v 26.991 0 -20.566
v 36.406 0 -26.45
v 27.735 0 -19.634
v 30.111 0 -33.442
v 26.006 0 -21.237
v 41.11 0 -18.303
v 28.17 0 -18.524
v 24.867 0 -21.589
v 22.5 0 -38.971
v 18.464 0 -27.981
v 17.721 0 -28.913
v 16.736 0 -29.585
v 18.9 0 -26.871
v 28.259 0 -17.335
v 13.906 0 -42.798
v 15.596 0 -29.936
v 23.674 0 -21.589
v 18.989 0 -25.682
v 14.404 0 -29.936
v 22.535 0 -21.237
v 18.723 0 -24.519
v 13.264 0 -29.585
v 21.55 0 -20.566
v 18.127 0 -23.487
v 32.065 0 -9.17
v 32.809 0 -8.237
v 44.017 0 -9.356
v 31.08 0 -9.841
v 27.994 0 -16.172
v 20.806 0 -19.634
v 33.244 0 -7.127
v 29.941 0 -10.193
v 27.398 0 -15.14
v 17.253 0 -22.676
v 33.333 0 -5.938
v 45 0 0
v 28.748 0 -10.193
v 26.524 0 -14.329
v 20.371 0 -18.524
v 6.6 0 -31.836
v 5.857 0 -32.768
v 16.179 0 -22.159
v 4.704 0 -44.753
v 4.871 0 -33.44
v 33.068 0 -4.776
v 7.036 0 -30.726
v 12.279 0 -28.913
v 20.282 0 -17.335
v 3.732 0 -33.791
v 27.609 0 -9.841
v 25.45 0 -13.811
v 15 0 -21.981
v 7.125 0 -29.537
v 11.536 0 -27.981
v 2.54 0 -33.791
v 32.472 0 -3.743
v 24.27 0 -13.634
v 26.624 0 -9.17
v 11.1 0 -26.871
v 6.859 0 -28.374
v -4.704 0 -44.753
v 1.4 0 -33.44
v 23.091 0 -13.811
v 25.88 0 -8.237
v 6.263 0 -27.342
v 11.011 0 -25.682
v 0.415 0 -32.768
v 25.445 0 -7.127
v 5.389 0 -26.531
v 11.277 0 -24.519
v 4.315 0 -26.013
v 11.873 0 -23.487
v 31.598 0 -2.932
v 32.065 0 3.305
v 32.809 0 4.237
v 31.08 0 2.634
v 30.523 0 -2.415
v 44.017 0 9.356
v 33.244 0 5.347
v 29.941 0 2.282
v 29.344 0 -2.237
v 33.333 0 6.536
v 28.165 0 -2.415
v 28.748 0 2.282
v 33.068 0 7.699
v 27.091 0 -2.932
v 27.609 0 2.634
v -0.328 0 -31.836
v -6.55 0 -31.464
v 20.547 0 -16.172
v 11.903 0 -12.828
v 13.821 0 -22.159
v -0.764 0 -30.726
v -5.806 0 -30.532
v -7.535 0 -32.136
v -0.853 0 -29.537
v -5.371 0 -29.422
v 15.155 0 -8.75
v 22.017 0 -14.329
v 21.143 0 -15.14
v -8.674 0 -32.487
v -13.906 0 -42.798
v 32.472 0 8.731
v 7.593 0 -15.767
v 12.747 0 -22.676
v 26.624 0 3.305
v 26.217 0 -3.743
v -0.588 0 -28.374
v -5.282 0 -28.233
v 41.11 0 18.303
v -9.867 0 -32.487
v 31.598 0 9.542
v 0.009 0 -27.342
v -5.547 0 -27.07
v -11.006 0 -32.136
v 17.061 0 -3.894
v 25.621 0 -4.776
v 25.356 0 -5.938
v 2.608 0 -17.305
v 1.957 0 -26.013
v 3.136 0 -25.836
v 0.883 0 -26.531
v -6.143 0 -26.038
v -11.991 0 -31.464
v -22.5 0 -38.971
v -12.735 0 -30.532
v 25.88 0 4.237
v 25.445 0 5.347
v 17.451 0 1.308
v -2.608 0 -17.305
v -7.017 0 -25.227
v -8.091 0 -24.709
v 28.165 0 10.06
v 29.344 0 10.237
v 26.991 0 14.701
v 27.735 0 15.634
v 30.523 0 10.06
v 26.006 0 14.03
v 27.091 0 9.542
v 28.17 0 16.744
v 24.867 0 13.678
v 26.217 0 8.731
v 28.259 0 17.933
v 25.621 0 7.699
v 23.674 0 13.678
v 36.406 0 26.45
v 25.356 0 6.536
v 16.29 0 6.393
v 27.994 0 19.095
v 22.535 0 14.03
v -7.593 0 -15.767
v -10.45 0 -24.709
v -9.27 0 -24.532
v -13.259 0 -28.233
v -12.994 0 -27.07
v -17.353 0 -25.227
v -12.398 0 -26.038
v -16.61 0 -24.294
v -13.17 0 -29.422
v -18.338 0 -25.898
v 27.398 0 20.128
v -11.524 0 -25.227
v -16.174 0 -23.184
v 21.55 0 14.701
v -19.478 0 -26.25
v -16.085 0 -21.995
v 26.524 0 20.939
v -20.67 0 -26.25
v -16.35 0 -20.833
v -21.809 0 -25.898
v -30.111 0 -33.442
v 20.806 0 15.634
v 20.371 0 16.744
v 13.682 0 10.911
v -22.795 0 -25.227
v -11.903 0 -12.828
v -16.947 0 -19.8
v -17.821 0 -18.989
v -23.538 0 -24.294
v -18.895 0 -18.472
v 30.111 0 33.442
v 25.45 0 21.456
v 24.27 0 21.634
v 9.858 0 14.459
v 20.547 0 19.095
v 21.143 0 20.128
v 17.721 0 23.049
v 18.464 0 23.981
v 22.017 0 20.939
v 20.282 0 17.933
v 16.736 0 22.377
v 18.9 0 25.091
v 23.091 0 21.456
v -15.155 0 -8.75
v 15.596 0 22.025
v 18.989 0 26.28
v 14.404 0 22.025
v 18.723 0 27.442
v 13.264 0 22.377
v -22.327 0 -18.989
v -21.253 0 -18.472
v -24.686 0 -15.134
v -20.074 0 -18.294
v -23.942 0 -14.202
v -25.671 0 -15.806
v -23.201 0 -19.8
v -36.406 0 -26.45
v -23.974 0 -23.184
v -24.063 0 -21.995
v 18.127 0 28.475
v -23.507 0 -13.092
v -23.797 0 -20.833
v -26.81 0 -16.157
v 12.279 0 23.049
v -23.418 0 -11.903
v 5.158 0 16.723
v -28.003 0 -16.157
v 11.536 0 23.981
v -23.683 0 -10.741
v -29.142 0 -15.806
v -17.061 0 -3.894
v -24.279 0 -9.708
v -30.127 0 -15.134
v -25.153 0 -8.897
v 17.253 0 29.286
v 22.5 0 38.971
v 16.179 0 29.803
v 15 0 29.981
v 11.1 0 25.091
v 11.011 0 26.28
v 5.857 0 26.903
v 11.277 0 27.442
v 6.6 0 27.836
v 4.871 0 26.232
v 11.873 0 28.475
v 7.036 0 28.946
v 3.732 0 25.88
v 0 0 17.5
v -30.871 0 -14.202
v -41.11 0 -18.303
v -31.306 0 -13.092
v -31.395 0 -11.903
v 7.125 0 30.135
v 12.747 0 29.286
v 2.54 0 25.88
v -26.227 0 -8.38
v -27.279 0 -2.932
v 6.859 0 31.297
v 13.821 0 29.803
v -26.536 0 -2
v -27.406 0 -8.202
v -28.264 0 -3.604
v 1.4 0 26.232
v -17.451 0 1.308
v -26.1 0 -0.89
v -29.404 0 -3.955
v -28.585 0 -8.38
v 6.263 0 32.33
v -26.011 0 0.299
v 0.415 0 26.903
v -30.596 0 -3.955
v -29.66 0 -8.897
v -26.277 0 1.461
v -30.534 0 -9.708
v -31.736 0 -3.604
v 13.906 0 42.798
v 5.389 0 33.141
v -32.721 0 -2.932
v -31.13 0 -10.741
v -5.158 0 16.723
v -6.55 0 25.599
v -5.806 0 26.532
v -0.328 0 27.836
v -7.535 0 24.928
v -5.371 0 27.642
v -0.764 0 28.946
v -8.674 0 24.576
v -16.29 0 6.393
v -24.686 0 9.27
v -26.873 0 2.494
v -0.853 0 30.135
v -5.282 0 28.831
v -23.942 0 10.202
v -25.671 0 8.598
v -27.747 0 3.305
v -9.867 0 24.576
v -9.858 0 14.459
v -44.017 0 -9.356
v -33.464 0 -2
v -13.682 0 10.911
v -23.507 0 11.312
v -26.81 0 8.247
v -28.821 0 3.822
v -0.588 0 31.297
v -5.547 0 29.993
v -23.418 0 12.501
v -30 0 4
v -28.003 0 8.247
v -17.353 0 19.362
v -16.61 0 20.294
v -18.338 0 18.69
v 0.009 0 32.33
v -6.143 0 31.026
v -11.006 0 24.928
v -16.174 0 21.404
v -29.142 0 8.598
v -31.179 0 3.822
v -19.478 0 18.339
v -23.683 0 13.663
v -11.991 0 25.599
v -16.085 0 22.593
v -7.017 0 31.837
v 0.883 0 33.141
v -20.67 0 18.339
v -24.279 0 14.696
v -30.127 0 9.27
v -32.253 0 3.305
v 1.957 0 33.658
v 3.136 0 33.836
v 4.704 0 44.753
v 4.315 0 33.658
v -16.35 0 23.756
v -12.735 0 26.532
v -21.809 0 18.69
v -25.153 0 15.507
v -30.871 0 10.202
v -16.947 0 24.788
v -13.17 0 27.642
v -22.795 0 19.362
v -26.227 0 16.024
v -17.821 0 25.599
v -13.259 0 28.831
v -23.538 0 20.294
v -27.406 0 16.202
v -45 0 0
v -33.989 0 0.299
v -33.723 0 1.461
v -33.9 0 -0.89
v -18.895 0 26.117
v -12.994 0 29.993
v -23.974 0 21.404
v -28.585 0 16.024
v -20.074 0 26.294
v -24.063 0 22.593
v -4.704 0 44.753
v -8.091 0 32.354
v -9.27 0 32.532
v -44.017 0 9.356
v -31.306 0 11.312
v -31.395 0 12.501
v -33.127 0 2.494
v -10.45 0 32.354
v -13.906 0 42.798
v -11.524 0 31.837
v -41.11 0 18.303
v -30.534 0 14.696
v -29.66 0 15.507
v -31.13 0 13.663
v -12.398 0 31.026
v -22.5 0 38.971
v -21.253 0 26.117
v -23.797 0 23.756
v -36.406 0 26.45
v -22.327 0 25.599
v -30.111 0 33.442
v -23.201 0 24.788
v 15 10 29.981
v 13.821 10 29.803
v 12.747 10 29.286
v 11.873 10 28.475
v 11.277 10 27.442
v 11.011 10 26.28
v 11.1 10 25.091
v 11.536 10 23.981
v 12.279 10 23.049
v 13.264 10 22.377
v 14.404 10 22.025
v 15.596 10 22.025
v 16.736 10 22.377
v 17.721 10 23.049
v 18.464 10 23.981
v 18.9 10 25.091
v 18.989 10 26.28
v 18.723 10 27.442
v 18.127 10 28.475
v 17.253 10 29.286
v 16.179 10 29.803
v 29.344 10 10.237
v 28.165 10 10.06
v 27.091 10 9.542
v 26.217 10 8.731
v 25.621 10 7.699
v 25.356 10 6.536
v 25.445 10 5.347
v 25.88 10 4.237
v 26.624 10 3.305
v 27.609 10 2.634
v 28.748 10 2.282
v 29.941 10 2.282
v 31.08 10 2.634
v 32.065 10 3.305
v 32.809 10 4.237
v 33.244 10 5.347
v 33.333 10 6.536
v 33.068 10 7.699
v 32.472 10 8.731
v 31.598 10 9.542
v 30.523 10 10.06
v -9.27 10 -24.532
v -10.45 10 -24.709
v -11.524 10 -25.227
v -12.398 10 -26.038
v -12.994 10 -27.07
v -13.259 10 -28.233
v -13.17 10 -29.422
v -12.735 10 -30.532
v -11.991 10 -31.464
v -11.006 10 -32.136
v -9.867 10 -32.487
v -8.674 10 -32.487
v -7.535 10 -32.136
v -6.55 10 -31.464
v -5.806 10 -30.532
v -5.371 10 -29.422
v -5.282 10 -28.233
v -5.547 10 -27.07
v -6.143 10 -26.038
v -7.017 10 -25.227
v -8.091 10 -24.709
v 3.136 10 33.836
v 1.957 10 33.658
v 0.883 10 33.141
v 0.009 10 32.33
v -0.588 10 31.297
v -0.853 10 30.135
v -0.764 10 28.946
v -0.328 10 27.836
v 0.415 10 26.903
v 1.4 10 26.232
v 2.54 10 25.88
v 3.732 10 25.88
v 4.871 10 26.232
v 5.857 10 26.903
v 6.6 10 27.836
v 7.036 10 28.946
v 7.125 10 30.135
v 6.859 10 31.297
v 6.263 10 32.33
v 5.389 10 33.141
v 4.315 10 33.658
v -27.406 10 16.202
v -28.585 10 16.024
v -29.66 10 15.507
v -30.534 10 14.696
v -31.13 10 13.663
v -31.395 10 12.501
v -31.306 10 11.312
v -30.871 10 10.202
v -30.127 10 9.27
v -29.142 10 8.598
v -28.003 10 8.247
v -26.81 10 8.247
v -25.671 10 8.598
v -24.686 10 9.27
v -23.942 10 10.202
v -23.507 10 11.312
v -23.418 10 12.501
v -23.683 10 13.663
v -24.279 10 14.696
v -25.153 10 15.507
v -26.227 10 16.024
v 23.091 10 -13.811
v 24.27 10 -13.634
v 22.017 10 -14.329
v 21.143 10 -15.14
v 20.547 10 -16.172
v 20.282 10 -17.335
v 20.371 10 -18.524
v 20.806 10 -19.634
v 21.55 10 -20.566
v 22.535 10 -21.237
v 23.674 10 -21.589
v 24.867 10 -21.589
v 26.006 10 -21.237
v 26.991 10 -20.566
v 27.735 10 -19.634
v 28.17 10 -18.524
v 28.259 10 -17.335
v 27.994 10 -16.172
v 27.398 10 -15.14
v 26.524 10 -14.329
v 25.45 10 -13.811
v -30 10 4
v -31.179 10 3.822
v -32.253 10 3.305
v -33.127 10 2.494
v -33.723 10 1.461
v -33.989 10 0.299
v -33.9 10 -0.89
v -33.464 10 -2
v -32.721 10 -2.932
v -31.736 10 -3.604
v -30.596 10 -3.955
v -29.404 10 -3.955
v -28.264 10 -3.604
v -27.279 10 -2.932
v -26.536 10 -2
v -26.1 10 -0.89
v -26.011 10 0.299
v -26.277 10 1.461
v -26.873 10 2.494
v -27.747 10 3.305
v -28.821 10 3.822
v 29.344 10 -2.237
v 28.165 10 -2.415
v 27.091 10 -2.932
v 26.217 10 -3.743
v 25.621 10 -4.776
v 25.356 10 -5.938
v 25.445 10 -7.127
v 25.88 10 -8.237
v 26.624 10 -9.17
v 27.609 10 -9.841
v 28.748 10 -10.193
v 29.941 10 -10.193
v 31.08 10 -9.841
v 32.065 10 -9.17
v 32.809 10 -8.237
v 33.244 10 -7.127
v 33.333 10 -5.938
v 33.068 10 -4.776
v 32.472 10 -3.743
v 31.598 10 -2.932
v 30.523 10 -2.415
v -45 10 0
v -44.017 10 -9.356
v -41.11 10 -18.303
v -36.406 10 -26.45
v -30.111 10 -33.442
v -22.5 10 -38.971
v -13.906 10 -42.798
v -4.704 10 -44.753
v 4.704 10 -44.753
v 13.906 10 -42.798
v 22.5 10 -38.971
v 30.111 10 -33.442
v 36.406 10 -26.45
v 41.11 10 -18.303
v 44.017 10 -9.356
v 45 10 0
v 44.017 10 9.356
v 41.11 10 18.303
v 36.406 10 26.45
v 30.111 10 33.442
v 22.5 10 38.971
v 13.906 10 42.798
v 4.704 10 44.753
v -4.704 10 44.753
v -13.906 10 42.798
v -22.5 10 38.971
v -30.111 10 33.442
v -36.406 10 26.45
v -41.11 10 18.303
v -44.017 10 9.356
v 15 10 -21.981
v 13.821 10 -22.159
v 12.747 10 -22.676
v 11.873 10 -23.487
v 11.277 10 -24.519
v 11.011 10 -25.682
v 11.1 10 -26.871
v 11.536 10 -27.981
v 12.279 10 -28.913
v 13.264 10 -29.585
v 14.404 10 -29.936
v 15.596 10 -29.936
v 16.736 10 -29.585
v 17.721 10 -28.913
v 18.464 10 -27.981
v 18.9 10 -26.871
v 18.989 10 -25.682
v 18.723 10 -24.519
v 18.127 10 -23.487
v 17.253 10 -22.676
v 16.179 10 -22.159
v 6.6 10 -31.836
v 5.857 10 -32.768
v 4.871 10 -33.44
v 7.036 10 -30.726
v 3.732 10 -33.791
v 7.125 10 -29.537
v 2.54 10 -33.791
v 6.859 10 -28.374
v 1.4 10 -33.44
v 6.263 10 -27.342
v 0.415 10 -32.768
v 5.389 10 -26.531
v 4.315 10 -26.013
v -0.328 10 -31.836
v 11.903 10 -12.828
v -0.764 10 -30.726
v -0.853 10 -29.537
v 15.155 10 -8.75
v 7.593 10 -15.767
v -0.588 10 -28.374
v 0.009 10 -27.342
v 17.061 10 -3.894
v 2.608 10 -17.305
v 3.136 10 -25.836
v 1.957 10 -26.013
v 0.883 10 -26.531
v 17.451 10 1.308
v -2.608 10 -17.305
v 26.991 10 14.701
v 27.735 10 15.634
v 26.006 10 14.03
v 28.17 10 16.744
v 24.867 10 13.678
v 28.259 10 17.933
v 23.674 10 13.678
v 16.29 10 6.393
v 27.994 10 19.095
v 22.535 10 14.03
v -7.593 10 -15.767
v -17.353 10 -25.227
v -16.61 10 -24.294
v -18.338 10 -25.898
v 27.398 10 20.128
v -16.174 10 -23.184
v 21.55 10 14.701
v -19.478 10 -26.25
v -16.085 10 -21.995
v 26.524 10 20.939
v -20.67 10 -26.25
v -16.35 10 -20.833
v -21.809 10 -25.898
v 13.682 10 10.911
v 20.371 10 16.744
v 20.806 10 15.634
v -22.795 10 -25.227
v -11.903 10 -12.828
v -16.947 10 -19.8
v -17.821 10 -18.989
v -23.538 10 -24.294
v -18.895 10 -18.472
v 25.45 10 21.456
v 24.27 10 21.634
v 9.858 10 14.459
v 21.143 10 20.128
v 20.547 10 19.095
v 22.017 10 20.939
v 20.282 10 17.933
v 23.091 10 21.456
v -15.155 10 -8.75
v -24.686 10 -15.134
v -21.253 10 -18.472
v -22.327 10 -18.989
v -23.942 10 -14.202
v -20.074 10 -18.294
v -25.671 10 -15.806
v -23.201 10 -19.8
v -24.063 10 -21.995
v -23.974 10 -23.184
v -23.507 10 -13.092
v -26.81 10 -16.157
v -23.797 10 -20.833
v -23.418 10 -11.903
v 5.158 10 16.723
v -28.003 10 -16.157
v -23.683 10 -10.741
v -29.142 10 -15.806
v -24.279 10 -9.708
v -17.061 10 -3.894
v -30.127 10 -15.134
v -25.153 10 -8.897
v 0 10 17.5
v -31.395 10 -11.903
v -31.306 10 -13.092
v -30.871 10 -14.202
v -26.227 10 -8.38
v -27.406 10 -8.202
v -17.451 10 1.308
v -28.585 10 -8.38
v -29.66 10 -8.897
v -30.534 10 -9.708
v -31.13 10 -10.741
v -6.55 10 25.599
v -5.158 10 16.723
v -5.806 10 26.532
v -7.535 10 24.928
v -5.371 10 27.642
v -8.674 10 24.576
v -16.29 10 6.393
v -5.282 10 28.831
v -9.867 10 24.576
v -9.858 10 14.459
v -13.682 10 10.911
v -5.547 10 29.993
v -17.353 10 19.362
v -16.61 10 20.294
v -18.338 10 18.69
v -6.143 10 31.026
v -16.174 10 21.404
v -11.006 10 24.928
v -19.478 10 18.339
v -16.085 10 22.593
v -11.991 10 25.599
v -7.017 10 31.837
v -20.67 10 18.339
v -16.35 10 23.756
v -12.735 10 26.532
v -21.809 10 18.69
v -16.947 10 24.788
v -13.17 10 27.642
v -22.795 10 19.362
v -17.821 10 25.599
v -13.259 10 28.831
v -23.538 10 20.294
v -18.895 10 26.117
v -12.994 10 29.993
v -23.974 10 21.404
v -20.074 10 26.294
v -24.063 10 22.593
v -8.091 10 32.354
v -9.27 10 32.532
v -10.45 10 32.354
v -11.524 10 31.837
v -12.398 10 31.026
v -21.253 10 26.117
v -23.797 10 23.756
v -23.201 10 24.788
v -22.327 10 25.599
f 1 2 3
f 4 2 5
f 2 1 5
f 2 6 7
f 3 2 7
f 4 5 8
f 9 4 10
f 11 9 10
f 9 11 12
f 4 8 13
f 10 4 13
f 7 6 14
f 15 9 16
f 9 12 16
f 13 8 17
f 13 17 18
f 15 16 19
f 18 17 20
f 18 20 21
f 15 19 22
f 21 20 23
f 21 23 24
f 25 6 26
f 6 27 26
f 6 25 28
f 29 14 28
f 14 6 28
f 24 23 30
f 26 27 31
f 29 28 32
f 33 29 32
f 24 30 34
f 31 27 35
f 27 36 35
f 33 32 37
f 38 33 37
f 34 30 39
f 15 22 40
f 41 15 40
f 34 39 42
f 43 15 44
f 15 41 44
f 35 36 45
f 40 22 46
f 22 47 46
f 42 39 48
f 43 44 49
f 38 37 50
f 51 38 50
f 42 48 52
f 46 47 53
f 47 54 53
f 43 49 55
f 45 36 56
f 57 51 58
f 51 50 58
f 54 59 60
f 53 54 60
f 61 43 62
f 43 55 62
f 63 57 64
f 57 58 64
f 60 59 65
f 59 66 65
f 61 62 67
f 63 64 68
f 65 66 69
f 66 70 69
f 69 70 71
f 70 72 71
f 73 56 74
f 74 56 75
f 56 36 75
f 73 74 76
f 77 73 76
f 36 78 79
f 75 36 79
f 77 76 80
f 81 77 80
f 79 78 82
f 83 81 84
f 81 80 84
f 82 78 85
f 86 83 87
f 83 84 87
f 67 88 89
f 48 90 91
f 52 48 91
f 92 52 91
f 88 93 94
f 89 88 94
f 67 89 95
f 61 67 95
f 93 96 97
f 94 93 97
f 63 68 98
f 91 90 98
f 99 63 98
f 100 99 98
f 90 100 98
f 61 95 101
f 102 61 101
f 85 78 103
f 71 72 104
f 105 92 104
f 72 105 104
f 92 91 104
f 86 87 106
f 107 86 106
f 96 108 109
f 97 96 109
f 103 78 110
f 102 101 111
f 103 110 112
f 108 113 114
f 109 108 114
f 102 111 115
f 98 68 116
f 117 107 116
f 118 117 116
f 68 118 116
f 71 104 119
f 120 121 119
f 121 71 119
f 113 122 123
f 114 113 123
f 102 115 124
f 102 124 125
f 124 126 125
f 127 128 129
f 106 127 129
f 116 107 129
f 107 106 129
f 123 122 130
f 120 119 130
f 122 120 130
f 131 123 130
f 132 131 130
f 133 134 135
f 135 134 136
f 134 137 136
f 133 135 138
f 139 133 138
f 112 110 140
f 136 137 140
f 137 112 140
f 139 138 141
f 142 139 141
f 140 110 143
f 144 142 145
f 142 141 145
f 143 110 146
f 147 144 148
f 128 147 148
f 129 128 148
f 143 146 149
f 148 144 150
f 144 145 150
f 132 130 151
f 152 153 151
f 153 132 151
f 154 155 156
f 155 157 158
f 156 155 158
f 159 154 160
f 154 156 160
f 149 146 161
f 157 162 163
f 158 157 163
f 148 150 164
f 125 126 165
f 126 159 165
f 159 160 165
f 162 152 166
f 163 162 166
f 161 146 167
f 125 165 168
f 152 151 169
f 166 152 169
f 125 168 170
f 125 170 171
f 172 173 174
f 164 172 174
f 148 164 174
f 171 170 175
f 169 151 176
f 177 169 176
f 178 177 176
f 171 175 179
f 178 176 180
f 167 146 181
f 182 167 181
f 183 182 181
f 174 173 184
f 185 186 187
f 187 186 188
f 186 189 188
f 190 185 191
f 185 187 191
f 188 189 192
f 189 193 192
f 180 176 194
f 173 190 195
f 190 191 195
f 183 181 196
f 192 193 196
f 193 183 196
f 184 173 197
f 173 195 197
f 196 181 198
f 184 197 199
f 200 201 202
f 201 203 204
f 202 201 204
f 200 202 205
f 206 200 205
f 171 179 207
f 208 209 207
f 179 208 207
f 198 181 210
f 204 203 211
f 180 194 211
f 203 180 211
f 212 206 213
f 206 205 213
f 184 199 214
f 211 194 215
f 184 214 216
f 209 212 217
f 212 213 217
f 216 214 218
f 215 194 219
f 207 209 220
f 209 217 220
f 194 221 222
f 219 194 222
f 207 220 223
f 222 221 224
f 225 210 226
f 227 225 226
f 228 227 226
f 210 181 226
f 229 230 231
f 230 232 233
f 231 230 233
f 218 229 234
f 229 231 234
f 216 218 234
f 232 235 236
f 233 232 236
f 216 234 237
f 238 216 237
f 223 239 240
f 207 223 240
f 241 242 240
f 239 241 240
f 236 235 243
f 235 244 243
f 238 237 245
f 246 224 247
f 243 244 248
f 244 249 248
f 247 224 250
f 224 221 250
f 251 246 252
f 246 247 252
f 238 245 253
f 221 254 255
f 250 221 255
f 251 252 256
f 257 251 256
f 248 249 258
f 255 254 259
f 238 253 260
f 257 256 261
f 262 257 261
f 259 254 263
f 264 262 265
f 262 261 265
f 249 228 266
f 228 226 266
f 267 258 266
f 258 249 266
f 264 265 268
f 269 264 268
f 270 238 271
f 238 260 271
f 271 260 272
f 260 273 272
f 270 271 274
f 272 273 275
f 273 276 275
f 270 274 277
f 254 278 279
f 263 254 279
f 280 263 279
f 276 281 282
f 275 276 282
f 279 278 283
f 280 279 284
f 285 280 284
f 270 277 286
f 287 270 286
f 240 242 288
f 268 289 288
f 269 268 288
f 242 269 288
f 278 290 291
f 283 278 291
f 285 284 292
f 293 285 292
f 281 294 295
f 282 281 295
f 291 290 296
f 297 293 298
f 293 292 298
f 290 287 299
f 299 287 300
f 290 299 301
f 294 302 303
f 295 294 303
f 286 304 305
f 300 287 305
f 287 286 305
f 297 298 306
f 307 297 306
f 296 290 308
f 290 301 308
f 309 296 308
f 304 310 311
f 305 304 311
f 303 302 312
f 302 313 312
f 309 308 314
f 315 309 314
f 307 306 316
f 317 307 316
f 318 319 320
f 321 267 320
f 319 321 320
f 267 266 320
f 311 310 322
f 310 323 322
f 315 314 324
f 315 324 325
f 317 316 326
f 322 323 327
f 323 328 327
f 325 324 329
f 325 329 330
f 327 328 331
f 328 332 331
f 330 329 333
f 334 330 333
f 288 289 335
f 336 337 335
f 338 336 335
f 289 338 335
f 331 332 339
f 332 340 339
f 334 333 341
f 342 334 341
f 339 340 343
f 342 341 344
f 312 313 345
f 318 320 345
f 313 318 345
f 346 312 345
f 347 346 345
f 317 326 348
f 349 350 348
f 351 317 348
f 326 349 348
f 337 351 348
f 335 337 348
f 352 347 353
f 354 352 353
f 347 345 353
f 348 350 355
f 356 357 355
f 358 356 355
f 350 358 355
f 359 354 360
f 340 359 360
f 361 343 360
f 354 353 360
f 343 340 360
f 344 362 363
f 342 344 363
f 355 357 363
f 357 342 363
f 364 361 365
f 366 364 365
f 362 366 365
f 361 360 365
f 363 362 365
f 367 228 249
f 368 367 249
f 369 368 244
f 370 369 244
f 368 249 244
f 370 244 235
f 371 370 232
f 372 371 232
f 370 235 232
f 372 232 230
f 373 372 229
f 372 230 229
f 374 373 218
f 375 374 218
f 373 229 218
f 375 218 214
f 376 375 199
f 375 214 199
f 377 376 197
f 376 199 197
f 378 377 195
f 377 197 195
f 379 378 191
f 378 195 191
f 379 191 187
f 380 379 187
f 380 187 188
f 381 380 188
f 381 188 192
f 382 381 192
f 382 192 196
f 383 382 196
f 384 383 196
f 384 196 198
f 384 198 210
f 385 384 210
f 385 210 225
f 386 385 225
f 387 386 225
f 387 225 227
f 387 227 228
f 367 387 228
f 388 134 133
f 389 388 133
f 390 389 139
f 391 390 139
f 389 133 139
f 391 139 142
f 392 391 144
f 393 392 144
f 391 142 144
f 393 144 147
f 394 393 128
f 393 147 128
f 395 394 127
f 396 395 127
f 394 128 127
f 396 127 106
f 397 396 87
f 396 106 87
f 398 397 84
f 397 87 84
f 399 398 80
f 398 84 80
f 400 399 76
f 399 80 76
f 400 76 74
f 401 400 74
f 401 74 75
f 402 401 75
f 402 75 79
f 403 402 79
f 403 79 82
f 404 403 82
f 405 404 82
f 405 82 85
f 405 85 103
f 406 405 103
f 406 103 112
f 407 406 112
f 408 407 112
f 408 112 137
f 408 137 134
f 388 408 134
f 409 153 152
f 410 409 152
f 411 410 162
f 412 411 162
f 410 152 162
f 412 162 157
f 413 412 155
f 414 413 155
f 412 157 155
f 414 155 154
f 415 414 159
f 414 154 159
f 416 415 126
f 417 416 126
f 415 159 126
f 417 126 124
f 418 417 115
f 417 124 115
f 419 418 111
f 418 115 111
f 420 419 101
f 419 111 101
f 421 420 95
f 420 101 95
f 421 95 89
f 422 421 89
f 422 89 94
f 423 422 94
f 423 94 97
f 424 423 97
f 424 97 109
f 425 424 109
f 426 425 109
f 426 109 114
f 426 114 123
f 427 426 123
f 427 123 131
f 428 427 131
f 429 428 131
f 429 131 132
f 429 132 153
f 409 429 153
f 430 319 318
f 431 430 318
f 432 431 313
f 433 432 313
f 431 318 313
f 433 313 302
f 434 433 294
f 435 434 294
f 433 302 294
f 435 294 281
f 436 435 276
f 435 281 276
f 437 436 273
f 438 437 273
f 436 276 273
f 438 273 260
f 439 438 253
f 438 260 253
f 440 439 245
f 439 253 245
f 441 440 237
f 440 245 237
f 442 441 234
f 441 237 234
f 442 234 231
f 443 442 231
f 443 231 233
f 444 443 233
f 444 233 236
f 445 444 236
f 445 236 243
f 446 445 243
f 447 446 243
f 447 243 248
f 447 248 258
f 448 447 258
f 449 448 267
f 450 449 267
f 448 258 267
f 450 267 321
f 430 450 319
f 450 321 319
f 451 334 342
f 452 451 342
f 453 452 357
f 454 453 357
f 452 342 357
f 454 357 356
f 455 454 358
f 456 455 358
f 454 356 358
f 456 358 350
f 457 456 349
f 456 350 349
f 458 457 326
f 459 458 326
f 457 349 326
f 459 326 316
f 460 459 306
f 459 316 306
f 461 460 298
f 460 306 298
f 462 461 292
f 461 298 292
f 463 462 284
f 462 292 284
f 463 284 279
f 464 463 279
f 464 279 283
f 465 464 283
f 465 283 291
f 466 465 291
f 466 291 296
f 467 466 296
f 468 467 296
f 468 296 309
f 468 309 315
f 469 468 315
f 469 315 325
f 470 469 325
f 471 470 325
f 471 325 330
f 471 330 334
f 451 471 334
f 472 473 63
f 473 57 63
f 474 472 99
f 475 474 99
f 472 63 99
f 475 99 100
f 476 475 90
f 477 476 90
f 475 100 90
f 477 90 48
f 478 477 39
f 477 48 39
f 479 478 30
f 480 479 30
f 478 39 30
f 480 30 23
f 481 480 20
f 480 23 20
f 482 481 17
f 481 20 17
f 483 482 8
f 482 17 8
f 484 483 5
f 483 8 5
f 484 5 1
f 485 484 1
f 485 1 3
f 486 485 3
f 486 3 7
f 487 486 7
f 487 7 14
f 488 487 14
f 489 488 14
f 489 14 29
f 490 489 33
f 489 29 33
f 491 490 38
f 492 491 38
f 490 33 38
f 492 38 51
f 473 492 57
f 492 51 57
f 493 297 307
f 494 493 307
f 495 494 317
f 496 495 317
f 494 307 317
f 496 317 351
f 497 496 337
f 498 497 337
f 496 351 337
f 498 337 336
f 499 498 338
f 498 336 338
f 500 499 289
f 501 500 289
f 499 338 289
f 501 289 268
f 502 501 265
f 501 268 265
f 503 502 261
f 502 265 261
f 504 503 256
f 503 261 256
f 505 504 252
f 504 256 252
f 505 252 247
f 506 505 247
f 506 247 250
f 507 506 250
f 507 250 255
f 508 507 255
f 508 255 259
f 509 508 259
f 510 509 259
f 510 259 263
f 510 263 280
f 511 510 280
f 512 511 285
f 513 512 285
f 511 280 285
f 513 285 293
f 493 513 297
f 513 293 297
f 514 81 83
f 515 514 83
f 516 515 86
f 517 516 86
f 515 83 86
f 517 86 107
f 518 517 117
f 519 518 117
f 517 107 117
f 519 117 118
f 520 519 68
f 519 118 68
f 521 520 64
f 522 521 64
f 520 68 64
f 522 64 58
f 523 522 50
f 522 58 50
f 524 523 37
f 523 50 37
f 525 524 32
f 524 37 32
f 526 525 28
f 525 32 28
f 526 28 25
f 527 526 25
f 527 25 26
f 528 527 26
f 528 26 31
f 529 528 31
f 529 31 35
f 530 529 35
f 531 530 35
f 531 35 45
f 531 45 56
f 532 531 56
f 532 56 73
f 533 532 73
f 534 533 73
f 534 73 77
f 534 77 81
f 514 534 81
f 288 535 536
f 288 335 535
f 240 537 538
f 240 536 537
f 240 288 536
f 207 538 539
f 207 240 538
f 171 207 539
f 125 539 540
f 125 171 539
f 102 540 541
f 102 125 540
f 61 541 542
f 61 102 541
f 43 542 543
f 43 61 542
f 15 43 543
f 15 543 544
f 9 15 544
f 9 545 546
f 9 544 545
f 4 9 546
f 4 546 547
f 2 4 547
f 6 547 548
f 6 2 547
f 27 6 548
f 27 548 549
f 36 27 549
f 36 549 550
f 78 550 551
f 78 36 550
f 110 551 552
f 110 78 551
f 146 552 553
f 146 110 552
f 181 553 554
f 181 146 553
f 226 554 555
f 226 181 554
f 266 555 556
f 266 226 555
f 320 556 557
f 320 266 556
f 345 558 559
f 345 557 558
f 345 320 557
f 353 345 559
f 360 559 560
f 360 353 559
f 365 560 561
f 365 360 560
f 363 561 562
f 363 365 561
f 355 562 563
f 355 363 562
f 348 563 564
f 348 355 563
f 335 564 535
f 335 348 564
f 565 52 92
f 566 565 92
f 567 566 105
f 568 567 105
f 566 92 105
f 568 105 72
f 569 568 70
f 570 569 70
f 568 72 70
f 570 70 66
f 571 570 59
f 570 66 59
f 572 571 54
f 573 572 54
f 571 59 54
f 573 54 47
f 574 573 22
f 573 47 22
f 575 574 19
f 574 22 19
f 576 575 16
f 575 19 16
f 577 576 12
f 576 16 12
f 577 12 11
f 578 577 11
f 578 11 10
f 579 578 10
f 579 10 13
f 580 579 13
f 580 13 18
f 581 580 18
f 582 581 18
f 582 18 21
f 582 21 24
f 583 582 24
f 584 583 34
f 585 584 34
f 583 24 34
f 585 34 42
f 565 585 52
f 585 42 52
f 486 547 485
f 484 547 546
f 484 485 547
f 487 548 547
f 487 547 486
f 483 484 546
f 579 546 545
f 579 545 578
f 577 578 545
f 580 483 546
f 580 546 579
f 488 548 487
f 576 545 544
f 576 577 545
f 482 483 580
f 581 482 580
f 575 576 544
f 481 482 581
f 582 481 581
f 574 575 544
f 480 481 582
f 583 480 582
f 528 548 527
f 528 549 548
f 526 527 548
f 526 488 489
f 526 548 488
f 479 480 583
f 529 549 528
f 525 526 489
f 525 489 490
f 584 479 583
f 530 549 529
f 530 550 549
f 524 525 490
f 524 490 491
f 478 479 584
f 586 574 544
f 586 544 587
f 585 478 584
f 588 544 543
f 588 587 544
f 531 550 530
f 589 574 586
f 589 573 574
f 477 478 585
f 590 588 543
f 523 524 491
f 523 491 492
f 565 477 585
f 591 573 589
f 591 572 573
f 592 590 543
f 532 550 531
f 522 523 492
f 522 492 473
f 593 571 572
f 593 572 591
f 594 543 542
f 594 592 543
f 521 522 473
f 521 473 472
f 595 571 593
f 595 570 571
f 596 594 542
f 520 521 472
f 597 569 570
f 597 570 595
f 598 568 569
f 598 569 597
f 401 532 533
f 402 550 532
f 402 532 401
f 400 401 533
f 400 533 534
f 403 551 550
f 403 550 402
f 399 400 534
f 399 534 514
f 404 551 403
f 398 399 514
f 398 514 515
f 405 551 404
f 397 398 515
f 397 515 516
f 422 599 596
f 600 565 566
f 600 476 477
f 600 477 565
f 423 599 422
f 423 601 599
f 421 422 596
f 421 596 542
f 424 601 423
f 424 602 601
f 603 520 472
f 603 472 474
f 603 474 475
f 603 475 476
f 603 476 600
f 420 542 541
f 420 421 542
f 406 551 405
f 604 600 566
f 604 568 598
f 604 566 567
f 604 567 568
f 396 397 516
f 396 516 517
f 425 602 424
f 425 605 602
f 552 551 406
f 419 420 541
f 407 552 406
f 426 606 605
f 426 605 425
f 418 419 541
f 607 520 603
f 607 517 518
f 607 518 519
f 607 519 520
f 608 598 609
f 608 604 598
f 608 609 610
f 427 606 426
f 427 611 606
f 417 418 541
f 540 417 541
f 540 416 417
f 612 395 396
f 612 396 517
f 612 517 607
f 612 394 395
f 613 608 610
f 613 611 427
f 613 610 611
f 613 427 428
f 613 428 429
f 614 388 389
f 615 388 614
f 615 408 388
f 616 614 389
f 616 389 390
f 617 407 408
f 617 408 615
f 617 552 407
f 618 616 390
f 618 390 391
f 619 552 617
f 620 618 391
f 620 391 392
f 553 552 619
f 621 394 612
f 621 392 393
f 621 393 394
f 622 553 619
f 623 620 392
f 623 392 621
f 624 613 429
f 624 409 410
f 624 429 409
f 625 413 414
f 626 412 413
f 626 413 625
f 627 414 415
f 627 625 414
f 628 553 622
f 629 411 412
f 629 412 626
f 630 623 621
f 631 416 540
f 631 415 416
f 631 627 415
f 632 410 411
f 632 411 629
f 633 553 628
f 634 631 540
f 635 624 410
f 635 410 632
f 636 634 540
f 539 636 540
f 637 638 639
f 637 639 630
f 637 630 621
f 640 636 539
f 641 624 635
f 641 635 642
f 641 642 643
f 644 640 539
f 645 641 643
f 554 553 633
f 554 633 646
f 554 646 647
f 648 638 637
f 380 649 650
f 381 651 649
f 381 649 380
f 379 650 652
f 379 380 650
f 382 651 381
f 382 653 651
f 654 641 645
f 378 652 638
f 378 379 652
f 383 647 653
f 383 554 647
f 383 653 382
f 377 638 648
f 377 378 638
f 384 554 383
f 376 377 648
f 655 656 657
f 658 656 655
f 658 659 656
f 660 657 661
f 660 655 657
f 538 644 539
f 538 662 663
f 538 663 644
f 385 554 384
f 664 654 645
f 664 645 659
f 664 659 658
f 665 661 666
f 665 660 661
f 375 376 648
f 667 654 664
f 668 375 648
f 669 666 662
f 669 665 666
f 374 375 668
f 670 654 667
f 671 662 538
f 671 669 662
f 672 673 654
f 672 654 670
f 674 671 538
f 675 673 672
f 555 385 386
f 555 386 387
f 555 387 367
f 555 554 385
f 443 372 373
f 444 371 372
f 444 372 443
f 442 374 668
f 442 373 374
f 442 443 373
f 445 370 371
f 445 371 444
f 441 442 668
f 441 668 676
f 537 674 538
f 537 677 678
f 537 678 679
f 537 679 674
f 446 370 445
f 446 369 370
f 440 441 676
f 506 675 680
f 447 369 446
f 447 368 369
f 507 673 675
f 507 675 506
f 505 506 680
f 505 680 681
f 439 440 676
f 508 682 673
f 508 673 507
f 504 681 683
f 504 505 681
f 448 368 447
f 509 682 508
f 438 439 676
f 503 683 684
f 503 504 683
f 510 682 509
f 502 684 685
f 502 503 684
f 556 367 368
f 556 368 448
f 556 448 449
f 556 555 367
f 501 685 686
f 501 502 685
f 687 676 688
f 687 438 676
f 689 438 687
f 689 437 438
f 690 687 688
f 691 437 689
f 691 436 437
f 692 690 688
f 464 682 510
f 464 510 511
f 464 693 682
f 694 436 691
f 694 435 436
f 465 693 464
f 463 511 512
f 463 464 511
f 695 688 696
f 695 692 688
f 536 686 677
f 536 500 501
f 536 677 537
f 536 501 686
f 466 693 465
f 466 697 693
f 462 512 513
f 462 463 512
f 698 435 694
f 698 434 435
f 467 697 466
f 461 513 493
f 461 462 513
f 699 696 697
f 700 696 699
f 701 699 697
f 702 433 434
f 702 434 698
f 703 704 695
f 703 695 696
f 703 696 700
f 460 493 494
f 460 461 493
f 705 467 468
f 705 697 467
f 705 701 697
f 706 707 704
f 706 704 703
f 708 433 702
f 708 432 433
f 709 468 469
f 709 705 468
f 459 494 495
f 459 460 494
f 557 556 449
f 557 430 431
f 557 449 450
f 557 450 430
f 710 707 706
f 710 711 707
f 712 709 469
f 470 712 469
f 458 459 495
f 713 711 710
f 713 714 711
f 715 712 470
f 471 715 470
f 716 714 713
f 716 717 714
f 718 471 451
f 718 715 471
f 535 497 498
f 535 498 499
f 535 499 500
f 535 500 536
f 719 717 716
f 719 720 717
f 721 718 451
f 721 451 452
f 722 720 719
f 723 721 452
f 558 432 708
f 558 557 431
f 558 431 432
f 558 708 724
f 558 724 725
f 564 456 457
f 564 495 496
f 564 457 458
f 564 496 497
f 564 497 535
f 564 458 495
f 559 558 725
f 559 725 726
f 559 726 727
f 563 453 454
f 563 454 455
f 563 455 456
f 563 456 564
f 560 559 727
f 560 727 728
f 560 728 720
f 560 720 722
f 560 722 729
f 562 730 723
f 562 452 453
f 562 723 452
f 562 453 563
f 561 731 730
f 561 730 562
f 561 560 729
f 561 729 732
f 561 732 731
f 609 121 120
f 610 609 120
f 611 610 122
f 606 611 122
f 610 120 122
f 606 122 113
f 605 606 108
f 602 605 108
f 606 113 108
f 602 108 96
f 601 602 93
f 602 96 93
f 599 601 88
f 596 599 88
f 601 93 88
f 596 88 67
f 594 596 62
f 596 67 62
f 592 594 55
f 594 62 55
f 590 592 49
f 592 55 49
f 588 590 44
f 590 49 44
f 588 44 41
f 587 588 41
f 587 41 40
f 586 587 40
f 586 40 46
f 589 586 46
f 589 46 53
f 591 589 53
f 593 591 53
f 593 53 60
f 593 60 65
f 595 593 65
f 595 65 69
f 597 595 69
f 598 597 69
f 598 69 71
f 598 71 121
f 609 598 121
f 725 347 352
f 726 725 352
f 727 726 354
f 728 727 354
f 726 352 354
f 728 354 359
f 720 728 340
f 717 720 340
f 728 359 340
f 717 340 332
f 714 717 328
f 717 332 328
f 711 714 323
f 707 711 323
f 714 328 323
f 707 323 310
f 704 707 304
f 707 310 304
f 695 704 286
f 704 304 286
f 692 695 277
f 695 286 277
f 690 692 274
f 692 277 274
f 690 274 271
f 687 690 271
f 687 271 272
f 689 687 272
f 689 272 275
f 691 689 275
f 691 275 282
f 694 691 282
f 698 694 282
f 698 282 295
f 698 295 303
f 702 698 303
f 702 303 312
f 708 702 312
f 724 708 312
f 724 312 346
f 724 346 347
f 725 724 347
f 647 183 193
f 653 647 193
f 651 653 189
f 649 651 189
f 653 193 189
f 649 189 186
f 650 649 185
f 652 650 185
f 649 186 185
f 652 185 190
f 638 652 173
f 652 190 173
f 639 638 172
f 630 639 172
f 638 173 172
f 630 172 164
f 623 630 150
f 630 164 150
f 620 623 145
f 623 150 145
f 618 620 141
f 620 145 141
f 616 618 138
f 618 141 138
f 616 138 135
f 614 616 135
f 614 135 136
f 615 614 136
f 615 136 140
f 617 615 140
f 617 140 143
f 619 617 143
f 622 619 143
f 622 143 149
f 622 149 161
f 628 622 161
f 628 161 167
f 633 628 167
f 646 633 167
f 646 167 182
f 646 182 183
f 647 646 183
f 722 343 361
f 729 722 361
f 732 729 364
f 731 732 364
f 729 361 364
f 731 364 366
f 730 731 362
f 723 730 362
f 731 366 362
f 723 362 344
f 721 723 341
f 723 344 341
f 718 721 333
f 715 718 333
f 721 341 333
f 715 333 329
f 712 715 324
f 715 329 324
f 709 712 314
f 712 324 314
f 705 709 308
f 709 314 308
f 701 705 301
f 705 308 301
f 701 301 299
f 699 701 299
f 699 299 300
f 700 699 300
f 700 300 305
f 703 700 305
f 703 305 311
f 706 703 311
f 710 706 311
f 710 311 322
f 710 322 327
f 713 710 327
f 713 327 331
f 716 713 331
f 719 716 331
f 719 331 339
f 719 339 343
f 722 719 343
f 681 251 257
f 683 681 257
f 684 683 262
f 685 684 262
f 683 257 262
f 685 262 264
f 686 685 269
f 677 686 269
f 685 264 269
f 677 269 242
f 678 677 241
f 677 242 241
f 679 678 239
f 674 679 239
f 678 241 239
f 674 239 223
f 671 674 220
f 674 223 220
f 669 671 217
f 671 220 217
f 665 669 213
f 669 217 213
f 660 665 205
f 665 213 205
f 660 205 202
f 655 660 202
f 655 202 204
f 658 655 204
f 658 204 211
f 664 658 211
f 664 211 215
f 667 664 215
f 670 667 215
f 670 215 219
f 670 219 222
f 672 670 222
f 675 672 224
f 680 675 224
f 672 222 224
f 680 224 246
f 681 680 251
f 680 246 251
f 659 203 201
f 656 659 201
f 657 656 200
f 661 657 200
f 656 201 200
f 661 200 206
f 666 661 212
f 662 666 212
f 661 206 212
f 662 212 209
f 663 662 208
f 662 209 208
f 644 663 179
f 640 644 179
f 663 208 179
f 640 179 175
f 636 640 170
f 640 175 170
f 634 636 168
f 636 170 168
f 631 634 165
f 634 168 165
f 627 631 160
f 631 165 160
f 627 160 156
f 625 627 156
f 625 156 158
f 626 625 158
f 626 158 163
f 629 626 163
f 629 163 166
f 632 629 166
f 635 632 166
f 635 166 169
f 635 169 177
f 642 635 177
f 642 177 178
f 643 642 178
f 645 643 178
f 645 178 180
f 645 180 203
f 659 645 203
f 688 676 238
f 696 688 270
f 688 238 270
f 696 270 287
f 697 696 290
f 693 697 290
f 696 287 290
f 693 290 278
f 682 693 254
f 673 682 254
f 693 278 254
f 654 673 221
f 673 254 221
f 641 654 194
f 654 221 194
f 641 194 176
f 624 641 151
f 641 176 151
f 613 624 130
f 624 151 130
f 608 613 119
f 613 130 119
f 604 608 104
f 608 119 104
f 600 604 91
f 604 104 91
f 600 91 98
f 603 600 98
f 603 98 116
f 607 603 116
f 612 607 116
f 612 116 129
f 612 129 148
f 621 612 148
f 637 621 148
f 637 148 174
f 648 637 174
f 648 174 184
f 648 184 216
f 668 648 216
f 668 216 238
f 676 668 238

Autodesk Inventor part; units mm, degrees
ref_plane "YZ Plane" through (0, 0, 0) normal (1, 0, 0) x (0, 1, 0)
ref_plane "XZ Plane" through (0, 0, 0) normal (0, 1, 0) x (-1, 0, 0)
ref_plane "XY Plane" through (0, 0, 0) normal (0, 0, 1) x (1, 0, 0)
sketch "Sketch1" plane through (0, 0, 0) normal (0, 1, 0) x (-1, 0, 0)
  circle A0 centre (0, 0) radius 45
  dimension "d1" = 90
extrude "Extrusion1" add sketch "Sketch1" along normal blind 10
sketch "Sketch2" plane through (0, 10, 0) normal (0, 1, 0) x (1, 0, 0)
  circle A0 centre (0, 0) radius 16
  dimension "d4" = 32
hole "Hole1" at (0, 10, 0) direction (0, -1, 0) diameter 35 end through all
sketch "Sketch4" plane through (0, 10, 0) normal (0, 1, 0) x (1, 0, 0)
  point P0 (0, 0)
sketch "Sketch5" plane through (0, 10, 0) normal (0, 1, 0) x (1, 0, 0)
  circle A0 centre (-30, 0) radius 4
  circle A1 centre (-27.4064, -12.2021) radius 4
  circle A2 centre (-20.0739, -22.2943) radius 4
  circle A3 centre (-9.2705, -28.5317) radius 4
  circle A4 centre (3.1359, -29.8357) radius 4
  circle A5 centre (15, -25.9808) radius 4
  circle A6 centre (24.2705, -17.6336) radius 4
  circle A7 centre (29.3444, -6.2374) radius 4
  circle A8 centre (29.3444, 6.2374) radius 4
  circle A9 centre (24.2705, 17.6336) radius 4
  circle A10 centre (15, 25.9808) radius 4
  circle A11 centre (3.1359, 29.8357) radius 4
  circle A12 centre (-9.2705, 28.5317) radius 4
  circle A13 centre (-20.0739, 22.2943) radius 4
  circle A14 centre (-27.4064, 12.2021) radius 4
  point P0 (0, 0)
  dimension "d29" = 8
  dimension "d30" = 30
  dimension "d33" = 360
hole "Hole3" at (-27.4064, 10, 12.2021) at (-30, 10, 0) at (-27.4064, 10, -12.2021) at (-20.0739, 10, -22.2943) at (-9.2705, 10, -28.5317) at (3.1359, 10, -29.8357) at (15, 10, -25.9808) at (24.2705, 10, -17.6336) at (29.3444, 10, -6.2374) at (29.3444, 10, 6.2374) at (24.2705, 10, 17.6336) at (15, 10, 25.9808) at (3.1359, 10, 29.8357) at (-9.2705, 10, 28.5317) at (-20.0739, 10, 22.2943) direction (0, -1, 0) diameter 8 end through all
sketch "Sketch7" plane through (0, 10, 0) normal (0, 1, 0) x (1, 0, 0)
  point P0 (0, 0)
properties part number "Orifice Plate" material "Stainless Steel"
